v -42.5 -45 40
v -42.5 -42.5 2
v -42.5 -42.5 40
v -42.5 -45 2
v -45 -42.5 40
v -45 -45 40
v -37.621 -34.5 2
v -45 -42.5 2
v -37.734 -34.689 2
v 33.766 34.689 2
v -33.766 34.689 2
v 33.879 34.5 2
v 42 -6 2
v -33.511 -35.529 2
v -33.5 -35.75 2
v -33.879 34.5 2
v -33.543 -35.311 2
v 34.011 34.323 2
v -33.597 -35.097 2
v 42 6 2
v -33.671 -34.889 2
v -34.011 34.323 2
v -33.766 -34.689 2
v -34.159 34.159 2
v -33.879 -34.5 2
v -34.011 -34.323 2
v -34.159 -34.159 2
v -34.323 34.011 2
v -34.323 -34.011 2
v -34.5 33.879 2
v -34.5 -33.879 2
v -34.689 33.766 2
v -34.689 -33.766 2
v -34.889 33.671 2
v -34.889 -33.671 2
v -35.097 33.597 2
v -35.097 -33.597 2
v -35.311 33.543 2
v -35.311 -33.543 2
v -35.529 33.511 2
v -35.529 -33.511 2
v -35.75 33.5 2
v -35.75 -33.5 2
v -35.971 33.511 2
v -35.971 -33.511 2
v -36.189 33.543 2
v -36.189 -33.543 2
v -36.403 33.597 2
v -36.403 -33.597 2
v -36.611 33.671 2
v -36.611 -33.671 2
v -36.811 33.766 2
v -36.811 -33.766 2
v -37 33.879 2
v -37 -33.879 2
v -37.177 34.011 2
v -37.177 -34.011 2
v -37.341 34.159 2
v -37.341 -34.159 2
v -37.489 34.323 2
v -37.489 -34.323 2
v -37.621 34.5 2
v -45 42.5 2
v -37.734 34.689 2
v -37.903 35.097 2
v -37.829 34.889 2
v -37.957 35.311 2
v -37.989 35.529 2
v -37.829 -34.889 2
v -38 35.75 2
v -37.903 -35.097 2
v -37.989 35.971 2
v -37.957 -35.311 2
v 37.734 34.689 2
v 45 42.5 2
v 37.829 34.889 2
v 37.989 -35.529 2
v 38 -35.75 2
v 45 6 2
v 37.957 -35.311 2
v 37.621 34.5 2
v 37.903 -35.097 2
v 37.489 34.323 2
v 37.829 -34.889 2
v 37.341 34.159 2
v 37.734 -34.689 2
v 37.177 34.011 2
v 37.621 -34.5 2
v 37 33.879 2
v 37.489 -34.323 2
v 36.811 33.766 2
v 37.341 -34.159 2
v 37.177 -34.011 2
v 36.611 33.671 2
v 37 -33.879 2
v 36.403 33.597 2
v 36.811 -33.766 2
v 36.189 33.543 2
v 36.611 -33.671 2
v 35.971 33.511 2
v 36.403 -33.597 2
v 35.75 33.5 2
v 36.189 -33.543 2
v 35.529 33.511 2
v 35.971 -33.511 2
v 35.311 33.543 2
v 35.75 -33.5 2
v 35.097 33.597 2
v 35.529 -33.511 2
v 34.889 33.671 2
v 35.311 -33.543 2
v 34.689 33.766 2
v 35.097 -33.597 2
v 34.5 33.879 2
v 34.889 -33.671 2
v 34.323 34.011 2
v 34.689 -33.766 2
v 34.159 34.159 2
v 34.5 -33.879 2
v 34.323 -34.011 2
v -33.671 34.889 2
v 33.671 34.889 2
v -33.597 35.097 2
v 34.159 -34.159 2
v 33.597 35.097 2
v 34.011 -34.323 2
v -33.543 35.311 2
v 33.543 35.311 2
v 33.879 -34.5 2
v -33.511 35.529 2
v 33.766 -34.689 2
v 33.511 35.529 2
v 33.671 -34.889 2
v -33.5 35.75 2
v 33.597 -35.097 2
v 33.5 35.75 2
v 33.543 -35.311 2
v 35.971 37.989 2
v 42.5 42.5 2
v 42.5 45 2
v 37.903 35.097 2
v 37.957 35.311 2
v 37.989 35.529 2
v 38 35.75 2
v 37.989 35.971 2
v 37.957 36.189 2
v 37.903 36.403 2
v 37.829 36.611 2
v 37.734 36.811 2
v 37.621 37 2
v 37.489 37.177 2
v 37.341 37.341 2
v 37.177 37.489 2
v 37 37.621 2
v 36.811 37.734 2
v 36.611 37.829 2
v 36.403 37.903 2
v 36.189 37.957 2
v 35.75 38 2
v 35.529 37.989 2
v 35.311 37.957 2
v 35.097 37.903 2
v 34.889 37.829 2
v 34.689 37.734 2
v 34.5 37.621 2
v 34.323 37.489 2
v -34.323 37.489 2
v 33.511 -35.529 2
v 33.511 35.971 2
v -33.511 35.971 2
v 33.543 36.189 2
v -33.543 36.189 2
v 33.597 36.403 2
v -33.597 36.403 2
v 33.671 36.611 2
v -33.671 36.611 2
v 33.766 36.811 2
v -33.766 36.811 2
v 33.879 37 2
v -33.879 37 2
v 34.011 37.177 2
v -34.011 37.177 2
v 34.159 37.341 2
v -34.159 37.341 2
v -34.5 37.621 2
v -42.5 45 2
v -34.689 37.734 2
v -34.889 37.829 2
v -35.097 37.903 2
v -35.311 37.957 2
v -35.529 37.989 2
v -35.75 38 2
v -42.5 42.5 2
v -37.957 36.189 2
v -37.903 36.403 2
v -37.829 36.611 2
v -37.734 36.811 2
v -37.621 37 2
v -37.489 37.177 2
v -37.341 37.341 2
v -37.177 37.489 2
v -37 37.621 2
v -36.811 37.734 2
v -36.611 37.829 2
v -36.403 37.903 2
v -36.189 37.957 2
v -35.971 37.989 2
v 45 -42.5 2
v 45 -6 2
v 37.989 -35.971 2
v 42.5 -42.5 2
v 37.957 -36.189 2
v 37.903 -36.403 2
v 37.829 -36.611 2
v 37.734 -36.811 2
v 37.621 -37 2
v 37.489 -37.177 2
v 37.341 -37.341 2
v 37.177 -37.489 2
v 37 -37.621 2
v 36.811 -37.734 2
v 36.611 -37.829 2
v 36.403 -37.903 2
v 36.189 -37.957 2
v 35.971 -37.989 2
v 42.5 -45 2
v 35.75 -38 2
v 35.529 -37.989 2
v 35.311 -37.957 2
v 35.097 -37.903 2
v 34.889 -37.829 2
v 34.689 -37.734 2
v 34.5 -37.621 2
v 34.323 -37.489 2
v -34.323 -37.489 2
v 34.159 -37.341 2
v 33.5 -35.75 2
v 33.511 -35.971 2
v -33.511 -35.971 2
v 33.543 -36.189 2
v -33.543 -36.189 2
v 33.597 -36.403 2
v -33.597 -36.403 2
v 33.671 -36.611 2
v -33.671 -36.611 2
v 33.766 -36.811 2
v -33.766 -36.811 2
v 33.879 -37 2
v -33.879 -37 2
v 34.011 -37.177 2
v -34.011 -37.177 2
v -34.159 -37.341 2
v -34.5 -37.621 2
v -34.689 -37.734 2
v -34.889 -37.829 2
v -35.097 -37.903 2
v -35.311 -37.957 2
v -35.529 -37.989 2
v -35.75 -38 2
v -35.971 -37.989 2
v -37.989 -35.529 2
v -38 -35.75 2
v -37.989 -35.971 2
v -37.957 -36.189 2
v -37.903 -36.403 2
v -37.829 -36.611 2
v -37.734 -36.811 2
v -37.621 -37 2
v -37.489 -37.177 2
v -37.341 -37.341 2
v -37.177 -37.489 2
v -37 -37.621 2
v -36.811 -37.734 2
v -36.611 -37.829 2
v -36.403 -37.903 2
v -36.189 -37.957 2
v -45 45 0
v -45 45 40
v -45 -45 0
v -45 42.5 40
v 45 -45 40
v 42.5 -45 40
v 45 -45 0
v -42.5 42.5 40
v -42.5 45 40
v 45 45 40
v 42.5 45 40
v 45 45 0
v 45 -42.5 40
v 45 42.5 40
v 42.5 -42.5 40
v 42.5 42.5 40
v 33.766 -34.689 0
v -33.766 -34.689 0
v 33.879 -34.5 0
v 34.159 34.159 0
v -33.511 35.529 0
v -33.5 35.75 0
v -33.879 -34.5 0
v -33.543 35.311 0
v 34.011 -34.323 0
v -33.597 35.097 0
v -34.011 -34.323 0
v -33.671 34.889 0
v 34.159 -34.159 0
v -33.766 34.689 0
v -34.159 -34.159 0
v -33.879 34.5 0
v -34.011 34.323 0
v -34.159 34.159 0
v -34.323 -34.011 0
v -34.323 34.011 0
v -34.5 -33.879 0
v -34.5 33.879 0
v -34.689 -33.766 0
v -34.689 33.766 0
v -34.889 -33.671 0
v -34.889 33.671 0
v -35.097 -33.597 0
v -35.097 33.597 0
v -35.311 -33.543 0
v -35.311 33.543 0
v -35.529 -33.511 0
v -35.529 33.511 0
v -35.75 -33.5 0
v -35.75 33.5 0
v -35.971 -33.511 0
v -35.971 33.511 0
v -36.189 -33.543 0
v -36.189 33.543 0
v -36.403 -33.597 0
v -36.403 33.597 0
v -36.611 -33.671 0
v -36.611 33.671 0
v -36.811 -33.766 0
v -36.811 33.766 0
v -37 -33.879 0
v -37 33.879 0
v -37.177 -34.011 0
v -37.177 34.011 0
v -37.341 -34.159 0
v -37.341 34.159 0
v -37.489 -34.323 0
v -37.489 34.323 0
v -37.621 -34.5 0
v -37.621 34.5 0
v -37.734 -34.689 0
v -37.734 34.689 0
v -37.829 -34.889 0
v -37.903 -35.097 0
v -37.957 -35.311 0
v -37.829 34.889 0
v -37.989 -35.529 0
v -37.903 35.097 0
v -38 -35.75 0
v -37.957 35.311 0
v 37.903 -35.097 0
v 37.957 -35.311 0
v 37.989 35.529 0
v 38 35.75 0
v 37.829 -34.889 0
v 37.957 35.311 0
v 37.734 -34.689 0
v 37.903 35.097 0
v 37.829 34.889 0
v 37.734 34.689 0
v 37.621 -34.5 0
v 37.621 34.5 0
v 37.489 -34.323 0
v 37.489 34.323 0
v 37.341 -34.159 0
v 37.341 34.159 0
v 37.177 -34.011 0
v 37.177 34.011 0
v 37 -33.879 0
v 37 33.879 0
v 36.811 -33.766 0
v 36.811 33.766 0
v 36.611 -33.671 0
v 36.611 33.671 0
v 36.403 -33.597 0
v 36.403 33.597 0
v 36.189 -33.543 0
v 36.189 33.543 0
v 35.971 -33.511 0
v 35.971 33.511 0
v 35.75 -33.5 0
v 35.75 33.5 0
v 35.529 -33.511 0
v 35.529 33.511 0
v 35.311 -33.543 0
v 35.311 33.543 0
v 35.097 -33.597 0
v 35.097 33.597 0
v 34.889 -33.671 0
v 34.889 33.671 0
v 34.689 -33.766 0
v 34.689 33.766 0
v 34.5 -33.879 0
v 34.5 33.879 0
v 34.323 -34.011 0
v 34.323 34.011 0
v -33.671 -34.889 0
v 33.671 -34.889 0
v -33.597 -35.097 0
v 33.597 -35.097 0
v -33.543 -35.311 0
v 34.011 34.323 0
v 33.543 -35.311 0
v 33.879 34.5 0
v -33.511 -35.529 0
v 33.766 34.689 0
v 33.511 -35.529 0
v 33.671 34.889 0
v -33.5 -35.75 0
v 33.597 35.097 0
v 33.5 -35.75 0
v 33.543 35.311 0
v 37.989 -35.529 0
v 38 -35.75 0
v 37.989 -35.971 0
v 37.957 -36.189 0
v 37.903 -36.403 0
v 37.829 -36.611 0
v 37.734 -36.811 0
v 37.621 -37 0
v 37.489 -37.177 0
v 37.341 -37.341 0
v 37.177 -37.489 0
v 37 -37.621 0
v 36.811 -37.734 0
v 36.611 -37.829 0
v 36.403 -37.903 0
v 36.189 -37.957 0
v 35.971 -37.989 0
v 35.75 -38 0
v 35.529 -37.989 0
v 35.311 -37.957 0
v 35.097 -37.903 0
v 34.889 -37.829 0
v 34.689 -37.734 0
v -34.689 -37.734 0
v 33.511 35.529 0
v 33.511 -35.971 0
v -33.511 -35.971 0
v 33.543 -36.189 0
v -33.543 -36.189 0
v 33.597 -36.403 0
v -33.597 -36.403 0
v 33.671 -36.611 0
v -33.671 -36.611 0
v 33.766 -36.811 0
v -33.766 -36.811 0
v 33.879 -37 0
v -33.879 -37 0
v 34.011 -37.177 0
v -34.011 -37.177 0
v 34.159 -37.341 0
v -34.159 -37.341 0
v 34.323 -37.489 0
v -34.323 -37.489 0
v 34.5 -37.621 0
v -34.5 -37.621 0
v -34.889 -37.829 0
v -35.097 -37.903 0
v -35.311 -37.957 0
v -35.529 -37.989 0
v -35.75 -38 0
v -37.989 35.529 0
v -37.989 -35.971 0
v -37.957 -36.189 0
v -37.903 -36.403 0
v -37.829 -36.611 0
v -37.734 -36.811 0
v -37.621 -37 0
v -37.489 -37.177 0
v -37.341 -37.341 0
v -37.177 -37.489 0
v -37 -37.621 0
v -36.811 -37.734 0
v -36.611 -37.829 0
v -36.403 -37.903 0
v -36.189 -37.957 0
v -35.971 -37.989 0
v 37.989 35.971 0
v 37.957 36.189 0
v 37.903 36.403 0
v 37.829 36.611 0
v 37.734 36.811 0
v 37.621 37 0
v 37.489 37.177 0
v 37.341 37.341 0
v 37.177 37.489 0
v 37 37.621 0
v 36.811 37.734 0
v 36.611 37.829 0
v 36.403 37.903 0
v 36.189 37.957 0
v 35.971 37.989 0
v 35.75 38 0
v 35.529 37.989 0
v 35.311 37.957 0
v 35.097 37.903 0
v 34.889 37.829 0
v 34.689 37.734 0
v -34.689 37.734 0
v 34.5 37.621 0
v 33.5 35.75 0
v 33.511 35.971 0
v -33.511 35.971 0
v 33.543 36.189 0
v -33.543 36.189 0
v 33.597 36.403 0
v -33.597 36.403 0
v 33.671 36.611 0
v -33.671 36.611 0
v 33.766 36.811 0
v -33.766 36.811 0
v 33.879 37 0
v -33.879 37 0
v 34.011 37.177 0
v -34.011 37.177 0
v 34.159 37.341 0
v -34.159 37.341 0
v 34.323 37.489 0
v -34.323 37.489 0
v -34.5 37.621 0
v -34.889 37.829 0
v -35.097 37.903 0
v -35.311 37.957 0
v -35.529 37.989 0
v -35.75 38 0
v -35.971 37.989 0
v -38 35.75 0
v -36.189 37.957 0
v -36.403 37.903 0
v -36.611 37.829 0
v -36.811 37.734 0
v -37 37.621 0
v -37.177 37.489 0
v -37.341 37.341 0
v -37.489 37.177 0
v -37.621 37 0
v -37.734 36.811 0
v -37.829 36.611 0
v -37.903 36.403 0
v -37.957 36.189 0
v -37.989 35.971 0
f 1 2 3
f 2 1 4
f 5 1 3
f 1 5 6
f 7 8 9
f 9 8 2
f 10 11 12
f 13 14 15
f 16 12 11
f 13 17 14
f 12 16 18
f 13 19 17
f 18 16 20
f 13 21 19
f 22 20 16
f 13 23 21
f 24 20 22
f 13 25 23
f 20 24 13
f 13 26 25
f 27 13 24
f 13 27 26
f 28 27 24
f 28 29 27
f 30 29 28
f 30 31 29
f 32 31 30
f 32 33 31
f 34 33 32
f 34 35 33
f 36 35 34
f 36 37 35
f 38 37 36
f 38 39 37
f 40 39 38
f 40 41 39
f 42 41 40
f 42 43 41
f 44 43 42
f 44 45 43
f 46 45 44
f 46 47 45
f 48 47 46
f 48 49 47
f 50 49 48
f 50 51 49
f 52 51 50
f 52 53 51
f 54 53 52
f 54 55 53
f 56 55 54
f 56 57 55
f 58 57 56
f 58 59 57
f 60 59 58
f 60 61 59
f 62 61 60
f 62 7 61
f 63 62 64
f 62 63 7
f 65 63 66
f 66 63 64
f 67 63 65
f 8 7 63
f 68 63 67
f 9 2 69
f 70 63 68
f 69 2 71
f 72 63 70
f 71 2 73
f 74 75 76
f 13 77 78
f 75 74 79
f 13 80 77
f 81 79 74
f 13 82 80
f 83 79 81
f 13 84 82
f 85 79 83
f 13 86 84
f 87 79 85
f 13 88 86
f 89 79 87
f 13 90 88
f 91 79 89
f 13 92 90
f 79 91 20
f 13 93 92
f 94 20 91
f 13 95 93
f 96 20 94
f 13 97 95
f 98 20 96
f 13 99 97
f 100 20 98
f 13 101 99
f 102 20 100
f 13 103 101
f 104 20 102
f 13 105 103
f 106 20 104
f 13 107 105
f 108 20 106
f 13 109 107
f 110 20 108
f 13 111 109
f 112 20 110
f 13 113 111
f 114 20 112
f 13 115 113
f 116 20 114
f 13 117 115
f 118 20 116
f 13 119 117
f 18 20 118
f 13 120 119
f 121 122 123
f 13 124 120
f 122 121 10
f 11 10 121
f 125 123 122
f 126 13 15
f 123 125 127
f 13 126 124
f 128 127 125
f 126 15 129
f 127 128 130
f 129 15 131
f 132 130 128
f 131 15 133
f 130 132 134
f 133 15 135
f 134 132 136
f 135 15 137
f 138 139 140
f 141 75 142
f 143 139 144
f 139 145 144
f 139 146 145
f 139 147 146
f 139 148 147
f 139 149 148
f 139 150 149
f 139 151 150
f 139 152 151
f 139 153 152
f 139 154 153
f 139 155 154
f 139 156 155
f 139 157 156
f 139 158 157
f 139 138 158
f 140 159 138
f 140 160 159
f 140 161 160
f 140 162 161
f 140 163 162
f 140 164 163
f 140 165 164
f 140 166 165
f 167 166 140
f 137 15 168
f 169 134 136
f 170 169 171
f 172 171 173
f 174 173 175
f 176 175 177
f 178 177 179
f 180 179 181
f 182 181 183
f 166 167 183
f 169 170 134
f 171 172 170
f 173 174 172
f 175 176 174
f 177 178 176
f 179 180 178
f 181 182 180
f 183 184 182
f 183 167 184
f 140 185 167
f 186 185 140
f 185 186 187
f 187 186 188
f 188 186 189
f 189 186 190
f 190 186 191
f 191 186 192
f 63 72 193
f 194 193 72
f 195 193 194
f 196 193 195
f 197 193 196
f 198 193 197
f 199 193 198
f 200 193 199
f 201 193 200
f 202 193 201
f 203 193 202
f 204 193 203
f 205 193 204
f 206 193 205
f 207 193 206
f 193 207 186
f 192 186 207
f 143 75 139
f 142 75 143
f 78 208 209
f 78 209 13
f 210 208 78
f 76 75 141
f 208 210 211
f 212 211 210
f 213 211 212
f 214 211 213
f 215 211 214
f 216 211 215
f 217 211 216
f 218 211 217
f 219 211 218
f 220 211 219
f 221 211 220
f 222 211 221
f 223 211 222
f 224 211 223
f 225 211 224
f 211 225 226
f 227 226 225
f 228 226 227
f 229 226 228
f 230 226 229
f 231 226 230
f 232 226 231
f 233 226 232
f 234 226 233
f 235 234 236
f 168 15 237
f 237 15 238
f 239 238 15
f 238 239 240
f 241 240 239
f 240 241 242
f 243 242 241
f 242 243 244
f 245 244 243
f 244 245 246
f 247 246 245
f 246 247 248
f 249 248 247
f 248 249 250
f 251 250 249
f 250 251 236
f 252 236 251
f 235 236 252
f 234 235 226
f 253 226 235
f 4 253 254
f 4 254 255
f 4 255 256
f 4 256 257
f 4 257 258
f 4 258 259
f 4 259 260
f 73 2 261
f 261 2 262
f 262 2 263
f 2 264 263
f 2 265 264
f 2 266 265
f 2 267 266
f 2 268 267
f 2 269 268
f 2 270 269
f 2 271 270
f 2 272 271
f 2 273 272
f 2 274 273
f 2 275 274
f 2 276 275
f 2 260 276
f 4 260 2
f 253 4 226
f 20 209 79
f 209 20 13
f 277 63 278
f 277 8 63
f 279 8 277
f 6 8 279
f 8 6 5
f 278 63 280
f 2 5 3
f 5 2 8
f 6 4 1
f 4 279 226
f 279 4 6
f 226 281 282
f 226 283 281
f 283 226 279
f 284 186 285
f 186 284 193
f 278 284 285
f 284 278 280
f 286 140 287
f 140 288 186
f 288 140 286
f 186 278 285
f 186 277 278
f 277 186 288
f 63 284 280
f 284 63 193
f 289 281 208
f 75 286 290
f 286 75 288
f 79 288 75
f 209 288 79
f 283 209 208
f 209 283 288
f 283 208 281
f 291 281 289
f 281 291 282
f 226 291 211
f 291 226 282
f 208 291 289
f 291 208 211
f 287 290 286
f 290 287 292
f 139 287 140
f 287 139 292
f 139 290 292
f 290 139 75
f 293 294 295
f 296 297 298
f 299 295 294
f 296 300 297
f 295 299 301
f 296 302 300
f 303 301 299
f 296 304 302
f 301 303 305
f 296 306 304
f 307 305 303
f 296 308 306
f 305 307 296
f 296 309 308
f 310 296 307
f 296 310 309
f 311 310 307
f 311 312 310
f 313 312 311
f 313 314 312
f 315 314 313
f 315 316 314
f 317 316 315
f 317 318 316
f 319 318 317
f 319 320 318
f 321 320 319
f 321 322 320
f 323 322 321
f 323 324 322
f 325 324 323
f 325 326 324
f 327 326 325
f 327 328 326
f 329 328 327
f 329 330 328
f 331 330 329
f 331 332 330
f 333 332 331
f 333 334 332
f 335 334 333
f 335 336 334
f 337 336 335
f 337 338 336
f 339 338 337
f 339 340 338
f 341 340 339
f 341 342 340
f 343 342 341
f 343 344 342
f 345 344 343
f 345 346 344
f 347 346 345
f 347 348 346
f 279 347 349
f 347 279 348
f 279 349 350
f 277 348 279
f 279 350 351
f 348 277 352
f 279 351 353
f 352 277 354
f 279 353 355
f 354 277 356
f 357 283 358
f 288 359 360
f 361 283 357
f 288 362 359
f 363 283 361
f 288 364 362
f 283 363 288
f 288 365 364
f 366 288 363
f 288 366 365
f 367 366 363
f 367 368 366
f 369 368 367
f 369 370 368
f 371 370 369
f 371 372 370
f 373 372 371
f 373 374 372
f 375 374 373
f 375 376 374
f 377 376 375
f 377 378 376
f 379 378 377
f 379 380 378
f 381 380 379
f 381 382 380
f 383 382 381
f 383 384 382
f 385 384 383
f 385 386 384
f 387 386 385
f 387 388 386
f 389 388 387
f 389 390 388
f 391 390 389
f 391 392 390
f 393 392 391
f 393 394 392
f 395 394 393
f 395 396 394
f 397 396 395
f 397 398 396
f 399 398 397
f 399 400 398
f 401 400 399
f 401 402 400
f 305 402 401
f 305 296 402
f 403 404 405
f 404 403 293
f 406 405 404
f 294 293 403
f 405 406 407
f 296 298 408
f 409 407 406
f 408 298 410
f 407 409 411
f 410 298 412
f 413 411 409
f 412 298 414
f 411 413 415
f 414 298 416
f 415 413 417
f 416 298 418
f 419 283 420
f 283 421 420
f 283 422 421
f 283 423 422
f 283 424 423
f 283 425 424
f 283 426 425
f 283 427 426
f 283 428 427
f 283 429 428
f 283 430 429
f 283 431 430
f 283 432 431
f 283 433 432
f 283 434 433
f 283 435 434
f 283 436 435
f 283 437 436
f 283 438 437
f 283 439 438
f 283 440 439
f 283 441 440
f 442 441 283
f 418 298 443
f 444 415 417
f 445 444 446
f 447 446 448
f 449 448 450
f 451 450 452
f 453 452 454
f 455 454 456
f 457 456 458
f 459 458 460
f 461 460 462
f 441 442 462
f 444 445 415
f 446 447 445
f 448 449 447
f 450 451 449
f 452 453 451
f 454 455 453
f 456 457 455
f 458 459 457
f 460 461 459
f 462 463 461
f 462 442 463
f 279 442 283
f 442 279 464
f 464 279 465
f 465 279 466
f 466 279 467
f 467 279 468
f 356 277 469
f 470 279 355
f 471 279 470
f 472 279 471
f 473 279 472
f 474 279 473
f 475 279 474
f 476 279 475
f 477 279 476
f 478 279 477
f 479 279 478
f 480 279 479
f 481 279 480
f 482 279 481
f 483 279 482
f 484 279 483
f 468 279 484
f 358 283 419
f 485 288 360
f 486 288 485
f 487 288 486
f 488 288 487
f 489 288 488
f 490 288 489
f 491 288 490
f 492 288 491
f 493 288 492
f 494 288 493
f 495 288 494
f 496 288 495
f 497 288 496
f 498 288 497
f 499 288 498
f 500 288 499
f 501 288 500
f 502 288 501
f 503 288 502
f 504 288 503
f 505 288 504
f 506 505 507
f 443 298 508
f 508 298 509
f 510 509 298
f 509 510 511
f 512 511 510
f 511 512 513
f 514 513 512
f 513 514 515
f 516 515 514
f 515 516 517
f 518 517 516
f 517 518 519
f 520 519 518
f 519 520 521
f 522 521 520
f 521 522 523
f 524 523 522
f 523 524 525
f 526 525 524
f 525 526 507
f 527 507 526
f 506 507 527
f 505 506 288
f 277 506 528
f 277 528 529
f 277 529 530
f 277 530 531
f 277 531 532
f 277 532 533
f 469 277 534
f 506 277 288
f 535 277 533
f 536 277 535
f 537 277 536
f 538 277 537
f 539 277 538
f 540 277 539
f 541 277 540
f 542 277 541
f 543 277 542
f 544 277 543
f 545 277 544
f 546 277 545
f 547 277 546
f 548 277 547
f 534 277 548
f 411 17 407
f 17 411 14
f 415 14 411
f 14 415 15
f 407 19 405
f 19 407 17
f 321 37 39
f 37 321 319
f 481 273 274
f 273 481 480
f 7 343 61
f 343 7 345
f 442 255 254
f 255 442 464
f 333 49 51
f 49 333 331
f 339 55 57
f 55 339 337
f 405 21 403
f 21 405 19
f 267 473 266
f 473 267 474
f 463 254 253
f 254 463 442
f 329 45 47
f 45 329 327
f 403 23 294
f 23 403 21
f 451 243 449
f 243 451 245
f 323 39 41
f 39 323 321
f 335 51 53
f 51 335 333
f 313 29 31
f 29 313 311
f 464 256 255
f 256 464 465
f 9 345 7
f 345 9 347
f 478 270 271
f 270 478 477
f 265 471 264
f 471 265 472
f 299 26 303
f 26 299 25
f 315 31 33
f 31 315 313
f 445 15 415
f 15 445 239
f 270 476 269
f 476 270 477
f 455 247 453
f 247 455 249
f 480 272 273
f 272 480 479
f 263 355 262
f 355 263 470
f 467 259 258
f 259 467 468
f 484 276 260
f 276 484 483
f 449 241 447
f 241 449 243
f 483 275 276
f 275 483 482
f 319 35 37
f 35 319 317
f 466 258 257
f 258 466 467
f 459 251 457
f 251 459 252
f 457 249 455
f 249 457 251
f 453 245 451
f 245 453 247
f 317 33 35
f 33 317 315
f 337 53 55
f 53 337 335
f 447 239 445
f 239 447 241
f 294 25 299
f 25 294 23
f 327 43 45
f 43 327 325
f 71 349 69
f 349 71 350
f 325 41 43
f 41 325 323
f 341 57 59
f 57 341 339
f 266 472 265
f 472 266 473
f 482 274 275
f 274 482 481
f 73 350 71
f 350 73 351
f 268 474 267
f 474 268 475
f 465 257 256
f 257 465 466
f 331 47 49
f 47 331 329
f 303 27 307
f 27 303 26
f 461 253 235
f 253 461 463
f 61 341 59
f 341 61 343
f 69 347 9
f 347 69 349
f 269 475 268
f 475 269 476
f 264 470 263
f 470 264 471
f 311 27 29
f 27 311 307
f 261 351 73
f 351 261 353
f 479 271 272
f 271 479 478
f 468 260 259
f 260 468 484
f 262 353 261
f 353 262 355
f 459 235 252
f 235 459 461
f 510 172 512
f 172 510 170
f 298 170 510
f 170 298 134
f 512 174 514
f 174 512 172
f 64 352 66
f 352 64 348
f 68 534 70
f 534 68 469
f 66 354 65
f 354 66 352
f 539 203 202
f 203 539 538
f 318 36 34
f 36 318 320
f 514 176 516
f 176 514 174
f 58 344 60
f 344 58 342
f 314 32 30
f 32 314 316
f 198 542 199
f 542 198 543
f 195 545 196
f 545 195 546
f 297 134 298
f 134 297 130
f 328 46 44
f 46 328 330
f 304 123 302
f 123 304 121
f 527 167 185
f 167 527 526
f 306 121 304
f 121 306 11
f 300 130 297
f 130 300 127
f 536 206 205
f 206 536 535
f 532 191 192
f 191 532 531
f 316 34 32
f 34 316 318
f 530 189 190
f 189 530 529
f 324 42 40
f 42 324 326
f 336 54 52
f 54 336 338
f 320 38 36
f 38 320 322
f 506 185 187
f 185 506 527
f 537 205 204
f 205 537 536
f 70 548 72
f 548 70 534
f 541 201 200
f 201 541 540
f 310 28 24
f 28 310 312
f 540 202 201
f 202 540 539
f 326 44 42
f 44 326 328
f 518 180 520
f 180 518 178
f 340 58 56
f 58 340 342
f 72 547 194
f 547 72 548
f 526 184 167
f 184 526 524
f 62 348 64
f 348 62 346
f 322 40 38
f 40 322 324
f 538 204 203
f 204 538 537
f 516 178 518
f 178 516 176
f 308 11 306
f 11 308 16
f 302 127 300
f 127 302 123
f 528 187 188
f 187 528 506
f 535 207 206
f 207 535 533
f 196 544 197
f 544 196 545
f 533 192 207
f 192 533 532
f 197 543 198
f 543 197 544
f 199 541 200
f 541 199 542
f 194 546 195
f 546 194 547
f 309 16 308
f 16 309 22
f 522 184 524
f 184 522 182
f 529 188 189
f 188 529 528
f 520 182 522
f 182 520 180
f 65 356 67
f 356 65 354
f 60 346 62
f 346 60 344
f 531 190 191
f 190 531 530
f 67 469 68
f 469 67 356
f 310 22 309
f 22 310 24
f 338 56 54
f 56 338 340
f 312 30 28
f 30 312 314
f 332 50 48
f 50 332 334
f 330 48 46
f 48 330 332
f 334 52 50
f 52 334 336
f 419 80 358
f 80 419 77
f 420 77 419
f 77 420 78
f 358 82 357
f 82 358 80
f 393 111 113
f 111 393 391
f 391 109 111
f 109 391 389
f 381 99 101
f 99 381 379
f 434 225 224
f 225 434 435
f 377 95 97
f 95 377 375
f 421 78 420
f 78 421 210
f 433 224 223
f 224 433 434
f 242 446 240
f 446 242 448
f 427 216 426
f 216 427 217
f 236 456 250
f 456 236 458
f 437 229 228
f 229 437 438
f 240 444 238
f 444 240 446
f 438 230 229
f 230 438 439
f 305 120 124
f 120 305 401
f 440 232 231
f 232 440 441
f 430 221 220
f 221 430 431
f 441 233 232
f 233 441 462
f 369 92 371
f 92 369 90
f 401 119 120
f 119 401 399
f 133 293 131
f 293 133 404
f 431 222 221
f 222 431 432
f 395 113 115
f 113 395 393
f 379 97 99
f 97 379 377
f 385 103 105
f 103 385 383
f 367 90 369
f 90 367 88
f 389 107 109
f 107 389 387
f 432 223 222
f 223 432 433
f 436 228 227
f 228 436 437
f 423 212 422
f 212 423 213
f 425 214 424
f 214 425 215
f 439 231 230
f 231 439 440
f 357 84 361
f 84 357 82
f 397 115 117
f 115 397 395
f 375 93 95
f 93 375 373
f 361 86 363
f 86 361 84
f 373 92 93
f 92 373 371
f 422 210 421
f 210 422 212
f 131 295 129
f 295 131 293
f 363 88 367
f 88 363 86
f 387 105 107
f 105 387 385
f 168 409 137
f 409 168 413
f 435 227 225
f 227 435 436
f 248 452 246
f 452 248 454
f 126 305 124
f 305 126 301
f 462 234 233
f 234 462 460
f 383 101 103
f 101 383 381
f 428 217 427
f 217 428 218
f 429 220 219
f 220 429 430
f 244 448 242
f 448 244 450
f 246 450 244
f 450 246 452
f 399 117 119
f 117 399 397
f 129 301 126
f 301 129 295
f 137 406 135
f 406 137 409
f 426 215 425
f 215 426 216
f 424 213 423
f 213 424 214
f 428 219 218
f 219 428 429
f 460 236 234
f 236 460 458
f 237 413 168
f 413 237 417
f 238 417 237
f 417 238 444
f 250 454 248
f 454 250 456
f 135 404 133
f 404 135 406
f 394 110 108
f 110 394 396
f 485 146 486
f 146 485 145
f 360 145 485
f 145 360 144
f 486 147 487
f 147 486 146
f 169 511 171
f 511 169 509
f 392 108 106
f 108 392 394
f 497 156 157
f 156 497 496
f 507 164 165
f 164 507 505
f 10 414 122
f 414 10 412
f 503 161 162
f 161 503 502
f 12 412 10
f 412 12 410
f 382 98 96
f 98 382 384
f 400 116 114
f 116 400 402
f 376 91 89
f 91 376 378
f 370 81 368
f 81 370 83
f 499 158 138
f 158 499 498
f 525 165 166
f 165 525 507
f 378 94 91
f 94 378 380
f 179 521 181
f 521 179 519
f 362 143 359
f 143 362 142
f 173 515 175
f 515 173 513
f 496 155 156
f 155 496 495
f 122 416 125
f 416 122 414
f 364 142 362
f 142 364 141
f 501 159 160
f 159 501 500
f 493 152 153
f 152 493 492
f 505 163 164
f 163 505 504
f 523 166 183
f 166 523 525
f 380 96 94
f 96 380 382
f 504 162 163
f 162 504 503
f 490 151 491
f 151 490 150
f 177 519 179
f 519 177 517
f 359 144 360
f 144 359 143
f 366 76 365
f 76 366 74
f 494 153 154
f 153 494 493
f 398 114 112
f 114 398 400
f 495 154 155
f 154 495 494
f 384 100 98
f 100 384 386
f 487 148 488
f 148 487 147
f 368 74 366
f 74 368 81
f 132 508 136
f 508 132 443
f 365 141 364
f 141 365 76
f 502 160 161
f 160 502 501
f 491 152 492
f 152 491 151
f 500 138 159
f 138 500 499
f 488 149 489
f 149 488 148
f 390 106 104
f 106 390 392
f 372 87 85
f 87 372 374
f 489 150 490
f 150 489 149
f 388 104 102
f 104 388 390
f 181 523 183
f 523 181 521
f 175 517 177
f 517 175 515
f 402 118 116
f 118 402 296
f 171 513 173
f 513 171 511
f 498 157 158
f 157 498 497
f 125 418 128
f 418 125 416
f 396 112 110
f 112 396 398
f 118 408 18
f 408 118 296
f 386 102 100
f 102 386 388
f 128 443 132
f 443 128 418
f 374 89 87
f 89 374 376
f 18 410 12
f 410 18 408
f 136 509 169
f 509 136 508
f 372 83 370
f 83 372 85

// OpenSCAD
// DIY magnetic stirrer housing for 80 mm PC case fan
// Print orientation: top plate on bed (z = 0), walls build upward (+Z)

$fn = 64;

// ---- Dimensions (mm) ----
plate_thickness   = 2;     // top plate thickness (z = 0 to 2)
wall_thickness    = 2.5;   // side walls thickness
box_height        = 40;    // outer height of box (top at z = 40)
outer_size        = 90;    // outer X and Y size of box
hole_size         = 4.5;   // screw holes diameter (M4)
hole_pattern      = 71.5;  // square pitch of screw holes
notch_width       = 12;    // power cable notch width
notch_depth       = 8;     // notch depth from open edge (z = 32 to 40)
eps               = 0.5;   // cutter overshoot past faces

// ---- Model ----
difference() {
    union() {
        // Top plate
        translate([-outer_size/2, -outer_size/2, 0])
            cube([outer_size, outer_size, plate_thickness]);

        // Four side walls, rising from top plate to z = box_height
        for (sx = [-1, 1], sy = [-1, 1])
            translate([sx > 0 ? outer_size/2 - wall_thickness : -outer_size/2,
                       sy > 0 ? outer_size/2 - wall_thickness : -outer_size/2,
                       plate_thickness])
                cube([wall_thickness, wall_thickness, box_height - plate_thickness]);
    }

    // Screw holes through top plate on centred square pattern
    for (x = [-hole_pattern/2, hole_pattern/2])
        for (y = [-hole_pattern/2, hole_pattern/2])
            translate([x, y, -eps])
                cylinder(d = hole_size, h = plate_thickness + 2*eps);

    // Power cable notch in one wall, centred along the wall
    translate([outer_size/2 - wall_thickness - eps, -notch_width/2, plate_thickness])
        cube([wall_thickness + 2*eps, notch_width, notch_depth + eps]);
}
